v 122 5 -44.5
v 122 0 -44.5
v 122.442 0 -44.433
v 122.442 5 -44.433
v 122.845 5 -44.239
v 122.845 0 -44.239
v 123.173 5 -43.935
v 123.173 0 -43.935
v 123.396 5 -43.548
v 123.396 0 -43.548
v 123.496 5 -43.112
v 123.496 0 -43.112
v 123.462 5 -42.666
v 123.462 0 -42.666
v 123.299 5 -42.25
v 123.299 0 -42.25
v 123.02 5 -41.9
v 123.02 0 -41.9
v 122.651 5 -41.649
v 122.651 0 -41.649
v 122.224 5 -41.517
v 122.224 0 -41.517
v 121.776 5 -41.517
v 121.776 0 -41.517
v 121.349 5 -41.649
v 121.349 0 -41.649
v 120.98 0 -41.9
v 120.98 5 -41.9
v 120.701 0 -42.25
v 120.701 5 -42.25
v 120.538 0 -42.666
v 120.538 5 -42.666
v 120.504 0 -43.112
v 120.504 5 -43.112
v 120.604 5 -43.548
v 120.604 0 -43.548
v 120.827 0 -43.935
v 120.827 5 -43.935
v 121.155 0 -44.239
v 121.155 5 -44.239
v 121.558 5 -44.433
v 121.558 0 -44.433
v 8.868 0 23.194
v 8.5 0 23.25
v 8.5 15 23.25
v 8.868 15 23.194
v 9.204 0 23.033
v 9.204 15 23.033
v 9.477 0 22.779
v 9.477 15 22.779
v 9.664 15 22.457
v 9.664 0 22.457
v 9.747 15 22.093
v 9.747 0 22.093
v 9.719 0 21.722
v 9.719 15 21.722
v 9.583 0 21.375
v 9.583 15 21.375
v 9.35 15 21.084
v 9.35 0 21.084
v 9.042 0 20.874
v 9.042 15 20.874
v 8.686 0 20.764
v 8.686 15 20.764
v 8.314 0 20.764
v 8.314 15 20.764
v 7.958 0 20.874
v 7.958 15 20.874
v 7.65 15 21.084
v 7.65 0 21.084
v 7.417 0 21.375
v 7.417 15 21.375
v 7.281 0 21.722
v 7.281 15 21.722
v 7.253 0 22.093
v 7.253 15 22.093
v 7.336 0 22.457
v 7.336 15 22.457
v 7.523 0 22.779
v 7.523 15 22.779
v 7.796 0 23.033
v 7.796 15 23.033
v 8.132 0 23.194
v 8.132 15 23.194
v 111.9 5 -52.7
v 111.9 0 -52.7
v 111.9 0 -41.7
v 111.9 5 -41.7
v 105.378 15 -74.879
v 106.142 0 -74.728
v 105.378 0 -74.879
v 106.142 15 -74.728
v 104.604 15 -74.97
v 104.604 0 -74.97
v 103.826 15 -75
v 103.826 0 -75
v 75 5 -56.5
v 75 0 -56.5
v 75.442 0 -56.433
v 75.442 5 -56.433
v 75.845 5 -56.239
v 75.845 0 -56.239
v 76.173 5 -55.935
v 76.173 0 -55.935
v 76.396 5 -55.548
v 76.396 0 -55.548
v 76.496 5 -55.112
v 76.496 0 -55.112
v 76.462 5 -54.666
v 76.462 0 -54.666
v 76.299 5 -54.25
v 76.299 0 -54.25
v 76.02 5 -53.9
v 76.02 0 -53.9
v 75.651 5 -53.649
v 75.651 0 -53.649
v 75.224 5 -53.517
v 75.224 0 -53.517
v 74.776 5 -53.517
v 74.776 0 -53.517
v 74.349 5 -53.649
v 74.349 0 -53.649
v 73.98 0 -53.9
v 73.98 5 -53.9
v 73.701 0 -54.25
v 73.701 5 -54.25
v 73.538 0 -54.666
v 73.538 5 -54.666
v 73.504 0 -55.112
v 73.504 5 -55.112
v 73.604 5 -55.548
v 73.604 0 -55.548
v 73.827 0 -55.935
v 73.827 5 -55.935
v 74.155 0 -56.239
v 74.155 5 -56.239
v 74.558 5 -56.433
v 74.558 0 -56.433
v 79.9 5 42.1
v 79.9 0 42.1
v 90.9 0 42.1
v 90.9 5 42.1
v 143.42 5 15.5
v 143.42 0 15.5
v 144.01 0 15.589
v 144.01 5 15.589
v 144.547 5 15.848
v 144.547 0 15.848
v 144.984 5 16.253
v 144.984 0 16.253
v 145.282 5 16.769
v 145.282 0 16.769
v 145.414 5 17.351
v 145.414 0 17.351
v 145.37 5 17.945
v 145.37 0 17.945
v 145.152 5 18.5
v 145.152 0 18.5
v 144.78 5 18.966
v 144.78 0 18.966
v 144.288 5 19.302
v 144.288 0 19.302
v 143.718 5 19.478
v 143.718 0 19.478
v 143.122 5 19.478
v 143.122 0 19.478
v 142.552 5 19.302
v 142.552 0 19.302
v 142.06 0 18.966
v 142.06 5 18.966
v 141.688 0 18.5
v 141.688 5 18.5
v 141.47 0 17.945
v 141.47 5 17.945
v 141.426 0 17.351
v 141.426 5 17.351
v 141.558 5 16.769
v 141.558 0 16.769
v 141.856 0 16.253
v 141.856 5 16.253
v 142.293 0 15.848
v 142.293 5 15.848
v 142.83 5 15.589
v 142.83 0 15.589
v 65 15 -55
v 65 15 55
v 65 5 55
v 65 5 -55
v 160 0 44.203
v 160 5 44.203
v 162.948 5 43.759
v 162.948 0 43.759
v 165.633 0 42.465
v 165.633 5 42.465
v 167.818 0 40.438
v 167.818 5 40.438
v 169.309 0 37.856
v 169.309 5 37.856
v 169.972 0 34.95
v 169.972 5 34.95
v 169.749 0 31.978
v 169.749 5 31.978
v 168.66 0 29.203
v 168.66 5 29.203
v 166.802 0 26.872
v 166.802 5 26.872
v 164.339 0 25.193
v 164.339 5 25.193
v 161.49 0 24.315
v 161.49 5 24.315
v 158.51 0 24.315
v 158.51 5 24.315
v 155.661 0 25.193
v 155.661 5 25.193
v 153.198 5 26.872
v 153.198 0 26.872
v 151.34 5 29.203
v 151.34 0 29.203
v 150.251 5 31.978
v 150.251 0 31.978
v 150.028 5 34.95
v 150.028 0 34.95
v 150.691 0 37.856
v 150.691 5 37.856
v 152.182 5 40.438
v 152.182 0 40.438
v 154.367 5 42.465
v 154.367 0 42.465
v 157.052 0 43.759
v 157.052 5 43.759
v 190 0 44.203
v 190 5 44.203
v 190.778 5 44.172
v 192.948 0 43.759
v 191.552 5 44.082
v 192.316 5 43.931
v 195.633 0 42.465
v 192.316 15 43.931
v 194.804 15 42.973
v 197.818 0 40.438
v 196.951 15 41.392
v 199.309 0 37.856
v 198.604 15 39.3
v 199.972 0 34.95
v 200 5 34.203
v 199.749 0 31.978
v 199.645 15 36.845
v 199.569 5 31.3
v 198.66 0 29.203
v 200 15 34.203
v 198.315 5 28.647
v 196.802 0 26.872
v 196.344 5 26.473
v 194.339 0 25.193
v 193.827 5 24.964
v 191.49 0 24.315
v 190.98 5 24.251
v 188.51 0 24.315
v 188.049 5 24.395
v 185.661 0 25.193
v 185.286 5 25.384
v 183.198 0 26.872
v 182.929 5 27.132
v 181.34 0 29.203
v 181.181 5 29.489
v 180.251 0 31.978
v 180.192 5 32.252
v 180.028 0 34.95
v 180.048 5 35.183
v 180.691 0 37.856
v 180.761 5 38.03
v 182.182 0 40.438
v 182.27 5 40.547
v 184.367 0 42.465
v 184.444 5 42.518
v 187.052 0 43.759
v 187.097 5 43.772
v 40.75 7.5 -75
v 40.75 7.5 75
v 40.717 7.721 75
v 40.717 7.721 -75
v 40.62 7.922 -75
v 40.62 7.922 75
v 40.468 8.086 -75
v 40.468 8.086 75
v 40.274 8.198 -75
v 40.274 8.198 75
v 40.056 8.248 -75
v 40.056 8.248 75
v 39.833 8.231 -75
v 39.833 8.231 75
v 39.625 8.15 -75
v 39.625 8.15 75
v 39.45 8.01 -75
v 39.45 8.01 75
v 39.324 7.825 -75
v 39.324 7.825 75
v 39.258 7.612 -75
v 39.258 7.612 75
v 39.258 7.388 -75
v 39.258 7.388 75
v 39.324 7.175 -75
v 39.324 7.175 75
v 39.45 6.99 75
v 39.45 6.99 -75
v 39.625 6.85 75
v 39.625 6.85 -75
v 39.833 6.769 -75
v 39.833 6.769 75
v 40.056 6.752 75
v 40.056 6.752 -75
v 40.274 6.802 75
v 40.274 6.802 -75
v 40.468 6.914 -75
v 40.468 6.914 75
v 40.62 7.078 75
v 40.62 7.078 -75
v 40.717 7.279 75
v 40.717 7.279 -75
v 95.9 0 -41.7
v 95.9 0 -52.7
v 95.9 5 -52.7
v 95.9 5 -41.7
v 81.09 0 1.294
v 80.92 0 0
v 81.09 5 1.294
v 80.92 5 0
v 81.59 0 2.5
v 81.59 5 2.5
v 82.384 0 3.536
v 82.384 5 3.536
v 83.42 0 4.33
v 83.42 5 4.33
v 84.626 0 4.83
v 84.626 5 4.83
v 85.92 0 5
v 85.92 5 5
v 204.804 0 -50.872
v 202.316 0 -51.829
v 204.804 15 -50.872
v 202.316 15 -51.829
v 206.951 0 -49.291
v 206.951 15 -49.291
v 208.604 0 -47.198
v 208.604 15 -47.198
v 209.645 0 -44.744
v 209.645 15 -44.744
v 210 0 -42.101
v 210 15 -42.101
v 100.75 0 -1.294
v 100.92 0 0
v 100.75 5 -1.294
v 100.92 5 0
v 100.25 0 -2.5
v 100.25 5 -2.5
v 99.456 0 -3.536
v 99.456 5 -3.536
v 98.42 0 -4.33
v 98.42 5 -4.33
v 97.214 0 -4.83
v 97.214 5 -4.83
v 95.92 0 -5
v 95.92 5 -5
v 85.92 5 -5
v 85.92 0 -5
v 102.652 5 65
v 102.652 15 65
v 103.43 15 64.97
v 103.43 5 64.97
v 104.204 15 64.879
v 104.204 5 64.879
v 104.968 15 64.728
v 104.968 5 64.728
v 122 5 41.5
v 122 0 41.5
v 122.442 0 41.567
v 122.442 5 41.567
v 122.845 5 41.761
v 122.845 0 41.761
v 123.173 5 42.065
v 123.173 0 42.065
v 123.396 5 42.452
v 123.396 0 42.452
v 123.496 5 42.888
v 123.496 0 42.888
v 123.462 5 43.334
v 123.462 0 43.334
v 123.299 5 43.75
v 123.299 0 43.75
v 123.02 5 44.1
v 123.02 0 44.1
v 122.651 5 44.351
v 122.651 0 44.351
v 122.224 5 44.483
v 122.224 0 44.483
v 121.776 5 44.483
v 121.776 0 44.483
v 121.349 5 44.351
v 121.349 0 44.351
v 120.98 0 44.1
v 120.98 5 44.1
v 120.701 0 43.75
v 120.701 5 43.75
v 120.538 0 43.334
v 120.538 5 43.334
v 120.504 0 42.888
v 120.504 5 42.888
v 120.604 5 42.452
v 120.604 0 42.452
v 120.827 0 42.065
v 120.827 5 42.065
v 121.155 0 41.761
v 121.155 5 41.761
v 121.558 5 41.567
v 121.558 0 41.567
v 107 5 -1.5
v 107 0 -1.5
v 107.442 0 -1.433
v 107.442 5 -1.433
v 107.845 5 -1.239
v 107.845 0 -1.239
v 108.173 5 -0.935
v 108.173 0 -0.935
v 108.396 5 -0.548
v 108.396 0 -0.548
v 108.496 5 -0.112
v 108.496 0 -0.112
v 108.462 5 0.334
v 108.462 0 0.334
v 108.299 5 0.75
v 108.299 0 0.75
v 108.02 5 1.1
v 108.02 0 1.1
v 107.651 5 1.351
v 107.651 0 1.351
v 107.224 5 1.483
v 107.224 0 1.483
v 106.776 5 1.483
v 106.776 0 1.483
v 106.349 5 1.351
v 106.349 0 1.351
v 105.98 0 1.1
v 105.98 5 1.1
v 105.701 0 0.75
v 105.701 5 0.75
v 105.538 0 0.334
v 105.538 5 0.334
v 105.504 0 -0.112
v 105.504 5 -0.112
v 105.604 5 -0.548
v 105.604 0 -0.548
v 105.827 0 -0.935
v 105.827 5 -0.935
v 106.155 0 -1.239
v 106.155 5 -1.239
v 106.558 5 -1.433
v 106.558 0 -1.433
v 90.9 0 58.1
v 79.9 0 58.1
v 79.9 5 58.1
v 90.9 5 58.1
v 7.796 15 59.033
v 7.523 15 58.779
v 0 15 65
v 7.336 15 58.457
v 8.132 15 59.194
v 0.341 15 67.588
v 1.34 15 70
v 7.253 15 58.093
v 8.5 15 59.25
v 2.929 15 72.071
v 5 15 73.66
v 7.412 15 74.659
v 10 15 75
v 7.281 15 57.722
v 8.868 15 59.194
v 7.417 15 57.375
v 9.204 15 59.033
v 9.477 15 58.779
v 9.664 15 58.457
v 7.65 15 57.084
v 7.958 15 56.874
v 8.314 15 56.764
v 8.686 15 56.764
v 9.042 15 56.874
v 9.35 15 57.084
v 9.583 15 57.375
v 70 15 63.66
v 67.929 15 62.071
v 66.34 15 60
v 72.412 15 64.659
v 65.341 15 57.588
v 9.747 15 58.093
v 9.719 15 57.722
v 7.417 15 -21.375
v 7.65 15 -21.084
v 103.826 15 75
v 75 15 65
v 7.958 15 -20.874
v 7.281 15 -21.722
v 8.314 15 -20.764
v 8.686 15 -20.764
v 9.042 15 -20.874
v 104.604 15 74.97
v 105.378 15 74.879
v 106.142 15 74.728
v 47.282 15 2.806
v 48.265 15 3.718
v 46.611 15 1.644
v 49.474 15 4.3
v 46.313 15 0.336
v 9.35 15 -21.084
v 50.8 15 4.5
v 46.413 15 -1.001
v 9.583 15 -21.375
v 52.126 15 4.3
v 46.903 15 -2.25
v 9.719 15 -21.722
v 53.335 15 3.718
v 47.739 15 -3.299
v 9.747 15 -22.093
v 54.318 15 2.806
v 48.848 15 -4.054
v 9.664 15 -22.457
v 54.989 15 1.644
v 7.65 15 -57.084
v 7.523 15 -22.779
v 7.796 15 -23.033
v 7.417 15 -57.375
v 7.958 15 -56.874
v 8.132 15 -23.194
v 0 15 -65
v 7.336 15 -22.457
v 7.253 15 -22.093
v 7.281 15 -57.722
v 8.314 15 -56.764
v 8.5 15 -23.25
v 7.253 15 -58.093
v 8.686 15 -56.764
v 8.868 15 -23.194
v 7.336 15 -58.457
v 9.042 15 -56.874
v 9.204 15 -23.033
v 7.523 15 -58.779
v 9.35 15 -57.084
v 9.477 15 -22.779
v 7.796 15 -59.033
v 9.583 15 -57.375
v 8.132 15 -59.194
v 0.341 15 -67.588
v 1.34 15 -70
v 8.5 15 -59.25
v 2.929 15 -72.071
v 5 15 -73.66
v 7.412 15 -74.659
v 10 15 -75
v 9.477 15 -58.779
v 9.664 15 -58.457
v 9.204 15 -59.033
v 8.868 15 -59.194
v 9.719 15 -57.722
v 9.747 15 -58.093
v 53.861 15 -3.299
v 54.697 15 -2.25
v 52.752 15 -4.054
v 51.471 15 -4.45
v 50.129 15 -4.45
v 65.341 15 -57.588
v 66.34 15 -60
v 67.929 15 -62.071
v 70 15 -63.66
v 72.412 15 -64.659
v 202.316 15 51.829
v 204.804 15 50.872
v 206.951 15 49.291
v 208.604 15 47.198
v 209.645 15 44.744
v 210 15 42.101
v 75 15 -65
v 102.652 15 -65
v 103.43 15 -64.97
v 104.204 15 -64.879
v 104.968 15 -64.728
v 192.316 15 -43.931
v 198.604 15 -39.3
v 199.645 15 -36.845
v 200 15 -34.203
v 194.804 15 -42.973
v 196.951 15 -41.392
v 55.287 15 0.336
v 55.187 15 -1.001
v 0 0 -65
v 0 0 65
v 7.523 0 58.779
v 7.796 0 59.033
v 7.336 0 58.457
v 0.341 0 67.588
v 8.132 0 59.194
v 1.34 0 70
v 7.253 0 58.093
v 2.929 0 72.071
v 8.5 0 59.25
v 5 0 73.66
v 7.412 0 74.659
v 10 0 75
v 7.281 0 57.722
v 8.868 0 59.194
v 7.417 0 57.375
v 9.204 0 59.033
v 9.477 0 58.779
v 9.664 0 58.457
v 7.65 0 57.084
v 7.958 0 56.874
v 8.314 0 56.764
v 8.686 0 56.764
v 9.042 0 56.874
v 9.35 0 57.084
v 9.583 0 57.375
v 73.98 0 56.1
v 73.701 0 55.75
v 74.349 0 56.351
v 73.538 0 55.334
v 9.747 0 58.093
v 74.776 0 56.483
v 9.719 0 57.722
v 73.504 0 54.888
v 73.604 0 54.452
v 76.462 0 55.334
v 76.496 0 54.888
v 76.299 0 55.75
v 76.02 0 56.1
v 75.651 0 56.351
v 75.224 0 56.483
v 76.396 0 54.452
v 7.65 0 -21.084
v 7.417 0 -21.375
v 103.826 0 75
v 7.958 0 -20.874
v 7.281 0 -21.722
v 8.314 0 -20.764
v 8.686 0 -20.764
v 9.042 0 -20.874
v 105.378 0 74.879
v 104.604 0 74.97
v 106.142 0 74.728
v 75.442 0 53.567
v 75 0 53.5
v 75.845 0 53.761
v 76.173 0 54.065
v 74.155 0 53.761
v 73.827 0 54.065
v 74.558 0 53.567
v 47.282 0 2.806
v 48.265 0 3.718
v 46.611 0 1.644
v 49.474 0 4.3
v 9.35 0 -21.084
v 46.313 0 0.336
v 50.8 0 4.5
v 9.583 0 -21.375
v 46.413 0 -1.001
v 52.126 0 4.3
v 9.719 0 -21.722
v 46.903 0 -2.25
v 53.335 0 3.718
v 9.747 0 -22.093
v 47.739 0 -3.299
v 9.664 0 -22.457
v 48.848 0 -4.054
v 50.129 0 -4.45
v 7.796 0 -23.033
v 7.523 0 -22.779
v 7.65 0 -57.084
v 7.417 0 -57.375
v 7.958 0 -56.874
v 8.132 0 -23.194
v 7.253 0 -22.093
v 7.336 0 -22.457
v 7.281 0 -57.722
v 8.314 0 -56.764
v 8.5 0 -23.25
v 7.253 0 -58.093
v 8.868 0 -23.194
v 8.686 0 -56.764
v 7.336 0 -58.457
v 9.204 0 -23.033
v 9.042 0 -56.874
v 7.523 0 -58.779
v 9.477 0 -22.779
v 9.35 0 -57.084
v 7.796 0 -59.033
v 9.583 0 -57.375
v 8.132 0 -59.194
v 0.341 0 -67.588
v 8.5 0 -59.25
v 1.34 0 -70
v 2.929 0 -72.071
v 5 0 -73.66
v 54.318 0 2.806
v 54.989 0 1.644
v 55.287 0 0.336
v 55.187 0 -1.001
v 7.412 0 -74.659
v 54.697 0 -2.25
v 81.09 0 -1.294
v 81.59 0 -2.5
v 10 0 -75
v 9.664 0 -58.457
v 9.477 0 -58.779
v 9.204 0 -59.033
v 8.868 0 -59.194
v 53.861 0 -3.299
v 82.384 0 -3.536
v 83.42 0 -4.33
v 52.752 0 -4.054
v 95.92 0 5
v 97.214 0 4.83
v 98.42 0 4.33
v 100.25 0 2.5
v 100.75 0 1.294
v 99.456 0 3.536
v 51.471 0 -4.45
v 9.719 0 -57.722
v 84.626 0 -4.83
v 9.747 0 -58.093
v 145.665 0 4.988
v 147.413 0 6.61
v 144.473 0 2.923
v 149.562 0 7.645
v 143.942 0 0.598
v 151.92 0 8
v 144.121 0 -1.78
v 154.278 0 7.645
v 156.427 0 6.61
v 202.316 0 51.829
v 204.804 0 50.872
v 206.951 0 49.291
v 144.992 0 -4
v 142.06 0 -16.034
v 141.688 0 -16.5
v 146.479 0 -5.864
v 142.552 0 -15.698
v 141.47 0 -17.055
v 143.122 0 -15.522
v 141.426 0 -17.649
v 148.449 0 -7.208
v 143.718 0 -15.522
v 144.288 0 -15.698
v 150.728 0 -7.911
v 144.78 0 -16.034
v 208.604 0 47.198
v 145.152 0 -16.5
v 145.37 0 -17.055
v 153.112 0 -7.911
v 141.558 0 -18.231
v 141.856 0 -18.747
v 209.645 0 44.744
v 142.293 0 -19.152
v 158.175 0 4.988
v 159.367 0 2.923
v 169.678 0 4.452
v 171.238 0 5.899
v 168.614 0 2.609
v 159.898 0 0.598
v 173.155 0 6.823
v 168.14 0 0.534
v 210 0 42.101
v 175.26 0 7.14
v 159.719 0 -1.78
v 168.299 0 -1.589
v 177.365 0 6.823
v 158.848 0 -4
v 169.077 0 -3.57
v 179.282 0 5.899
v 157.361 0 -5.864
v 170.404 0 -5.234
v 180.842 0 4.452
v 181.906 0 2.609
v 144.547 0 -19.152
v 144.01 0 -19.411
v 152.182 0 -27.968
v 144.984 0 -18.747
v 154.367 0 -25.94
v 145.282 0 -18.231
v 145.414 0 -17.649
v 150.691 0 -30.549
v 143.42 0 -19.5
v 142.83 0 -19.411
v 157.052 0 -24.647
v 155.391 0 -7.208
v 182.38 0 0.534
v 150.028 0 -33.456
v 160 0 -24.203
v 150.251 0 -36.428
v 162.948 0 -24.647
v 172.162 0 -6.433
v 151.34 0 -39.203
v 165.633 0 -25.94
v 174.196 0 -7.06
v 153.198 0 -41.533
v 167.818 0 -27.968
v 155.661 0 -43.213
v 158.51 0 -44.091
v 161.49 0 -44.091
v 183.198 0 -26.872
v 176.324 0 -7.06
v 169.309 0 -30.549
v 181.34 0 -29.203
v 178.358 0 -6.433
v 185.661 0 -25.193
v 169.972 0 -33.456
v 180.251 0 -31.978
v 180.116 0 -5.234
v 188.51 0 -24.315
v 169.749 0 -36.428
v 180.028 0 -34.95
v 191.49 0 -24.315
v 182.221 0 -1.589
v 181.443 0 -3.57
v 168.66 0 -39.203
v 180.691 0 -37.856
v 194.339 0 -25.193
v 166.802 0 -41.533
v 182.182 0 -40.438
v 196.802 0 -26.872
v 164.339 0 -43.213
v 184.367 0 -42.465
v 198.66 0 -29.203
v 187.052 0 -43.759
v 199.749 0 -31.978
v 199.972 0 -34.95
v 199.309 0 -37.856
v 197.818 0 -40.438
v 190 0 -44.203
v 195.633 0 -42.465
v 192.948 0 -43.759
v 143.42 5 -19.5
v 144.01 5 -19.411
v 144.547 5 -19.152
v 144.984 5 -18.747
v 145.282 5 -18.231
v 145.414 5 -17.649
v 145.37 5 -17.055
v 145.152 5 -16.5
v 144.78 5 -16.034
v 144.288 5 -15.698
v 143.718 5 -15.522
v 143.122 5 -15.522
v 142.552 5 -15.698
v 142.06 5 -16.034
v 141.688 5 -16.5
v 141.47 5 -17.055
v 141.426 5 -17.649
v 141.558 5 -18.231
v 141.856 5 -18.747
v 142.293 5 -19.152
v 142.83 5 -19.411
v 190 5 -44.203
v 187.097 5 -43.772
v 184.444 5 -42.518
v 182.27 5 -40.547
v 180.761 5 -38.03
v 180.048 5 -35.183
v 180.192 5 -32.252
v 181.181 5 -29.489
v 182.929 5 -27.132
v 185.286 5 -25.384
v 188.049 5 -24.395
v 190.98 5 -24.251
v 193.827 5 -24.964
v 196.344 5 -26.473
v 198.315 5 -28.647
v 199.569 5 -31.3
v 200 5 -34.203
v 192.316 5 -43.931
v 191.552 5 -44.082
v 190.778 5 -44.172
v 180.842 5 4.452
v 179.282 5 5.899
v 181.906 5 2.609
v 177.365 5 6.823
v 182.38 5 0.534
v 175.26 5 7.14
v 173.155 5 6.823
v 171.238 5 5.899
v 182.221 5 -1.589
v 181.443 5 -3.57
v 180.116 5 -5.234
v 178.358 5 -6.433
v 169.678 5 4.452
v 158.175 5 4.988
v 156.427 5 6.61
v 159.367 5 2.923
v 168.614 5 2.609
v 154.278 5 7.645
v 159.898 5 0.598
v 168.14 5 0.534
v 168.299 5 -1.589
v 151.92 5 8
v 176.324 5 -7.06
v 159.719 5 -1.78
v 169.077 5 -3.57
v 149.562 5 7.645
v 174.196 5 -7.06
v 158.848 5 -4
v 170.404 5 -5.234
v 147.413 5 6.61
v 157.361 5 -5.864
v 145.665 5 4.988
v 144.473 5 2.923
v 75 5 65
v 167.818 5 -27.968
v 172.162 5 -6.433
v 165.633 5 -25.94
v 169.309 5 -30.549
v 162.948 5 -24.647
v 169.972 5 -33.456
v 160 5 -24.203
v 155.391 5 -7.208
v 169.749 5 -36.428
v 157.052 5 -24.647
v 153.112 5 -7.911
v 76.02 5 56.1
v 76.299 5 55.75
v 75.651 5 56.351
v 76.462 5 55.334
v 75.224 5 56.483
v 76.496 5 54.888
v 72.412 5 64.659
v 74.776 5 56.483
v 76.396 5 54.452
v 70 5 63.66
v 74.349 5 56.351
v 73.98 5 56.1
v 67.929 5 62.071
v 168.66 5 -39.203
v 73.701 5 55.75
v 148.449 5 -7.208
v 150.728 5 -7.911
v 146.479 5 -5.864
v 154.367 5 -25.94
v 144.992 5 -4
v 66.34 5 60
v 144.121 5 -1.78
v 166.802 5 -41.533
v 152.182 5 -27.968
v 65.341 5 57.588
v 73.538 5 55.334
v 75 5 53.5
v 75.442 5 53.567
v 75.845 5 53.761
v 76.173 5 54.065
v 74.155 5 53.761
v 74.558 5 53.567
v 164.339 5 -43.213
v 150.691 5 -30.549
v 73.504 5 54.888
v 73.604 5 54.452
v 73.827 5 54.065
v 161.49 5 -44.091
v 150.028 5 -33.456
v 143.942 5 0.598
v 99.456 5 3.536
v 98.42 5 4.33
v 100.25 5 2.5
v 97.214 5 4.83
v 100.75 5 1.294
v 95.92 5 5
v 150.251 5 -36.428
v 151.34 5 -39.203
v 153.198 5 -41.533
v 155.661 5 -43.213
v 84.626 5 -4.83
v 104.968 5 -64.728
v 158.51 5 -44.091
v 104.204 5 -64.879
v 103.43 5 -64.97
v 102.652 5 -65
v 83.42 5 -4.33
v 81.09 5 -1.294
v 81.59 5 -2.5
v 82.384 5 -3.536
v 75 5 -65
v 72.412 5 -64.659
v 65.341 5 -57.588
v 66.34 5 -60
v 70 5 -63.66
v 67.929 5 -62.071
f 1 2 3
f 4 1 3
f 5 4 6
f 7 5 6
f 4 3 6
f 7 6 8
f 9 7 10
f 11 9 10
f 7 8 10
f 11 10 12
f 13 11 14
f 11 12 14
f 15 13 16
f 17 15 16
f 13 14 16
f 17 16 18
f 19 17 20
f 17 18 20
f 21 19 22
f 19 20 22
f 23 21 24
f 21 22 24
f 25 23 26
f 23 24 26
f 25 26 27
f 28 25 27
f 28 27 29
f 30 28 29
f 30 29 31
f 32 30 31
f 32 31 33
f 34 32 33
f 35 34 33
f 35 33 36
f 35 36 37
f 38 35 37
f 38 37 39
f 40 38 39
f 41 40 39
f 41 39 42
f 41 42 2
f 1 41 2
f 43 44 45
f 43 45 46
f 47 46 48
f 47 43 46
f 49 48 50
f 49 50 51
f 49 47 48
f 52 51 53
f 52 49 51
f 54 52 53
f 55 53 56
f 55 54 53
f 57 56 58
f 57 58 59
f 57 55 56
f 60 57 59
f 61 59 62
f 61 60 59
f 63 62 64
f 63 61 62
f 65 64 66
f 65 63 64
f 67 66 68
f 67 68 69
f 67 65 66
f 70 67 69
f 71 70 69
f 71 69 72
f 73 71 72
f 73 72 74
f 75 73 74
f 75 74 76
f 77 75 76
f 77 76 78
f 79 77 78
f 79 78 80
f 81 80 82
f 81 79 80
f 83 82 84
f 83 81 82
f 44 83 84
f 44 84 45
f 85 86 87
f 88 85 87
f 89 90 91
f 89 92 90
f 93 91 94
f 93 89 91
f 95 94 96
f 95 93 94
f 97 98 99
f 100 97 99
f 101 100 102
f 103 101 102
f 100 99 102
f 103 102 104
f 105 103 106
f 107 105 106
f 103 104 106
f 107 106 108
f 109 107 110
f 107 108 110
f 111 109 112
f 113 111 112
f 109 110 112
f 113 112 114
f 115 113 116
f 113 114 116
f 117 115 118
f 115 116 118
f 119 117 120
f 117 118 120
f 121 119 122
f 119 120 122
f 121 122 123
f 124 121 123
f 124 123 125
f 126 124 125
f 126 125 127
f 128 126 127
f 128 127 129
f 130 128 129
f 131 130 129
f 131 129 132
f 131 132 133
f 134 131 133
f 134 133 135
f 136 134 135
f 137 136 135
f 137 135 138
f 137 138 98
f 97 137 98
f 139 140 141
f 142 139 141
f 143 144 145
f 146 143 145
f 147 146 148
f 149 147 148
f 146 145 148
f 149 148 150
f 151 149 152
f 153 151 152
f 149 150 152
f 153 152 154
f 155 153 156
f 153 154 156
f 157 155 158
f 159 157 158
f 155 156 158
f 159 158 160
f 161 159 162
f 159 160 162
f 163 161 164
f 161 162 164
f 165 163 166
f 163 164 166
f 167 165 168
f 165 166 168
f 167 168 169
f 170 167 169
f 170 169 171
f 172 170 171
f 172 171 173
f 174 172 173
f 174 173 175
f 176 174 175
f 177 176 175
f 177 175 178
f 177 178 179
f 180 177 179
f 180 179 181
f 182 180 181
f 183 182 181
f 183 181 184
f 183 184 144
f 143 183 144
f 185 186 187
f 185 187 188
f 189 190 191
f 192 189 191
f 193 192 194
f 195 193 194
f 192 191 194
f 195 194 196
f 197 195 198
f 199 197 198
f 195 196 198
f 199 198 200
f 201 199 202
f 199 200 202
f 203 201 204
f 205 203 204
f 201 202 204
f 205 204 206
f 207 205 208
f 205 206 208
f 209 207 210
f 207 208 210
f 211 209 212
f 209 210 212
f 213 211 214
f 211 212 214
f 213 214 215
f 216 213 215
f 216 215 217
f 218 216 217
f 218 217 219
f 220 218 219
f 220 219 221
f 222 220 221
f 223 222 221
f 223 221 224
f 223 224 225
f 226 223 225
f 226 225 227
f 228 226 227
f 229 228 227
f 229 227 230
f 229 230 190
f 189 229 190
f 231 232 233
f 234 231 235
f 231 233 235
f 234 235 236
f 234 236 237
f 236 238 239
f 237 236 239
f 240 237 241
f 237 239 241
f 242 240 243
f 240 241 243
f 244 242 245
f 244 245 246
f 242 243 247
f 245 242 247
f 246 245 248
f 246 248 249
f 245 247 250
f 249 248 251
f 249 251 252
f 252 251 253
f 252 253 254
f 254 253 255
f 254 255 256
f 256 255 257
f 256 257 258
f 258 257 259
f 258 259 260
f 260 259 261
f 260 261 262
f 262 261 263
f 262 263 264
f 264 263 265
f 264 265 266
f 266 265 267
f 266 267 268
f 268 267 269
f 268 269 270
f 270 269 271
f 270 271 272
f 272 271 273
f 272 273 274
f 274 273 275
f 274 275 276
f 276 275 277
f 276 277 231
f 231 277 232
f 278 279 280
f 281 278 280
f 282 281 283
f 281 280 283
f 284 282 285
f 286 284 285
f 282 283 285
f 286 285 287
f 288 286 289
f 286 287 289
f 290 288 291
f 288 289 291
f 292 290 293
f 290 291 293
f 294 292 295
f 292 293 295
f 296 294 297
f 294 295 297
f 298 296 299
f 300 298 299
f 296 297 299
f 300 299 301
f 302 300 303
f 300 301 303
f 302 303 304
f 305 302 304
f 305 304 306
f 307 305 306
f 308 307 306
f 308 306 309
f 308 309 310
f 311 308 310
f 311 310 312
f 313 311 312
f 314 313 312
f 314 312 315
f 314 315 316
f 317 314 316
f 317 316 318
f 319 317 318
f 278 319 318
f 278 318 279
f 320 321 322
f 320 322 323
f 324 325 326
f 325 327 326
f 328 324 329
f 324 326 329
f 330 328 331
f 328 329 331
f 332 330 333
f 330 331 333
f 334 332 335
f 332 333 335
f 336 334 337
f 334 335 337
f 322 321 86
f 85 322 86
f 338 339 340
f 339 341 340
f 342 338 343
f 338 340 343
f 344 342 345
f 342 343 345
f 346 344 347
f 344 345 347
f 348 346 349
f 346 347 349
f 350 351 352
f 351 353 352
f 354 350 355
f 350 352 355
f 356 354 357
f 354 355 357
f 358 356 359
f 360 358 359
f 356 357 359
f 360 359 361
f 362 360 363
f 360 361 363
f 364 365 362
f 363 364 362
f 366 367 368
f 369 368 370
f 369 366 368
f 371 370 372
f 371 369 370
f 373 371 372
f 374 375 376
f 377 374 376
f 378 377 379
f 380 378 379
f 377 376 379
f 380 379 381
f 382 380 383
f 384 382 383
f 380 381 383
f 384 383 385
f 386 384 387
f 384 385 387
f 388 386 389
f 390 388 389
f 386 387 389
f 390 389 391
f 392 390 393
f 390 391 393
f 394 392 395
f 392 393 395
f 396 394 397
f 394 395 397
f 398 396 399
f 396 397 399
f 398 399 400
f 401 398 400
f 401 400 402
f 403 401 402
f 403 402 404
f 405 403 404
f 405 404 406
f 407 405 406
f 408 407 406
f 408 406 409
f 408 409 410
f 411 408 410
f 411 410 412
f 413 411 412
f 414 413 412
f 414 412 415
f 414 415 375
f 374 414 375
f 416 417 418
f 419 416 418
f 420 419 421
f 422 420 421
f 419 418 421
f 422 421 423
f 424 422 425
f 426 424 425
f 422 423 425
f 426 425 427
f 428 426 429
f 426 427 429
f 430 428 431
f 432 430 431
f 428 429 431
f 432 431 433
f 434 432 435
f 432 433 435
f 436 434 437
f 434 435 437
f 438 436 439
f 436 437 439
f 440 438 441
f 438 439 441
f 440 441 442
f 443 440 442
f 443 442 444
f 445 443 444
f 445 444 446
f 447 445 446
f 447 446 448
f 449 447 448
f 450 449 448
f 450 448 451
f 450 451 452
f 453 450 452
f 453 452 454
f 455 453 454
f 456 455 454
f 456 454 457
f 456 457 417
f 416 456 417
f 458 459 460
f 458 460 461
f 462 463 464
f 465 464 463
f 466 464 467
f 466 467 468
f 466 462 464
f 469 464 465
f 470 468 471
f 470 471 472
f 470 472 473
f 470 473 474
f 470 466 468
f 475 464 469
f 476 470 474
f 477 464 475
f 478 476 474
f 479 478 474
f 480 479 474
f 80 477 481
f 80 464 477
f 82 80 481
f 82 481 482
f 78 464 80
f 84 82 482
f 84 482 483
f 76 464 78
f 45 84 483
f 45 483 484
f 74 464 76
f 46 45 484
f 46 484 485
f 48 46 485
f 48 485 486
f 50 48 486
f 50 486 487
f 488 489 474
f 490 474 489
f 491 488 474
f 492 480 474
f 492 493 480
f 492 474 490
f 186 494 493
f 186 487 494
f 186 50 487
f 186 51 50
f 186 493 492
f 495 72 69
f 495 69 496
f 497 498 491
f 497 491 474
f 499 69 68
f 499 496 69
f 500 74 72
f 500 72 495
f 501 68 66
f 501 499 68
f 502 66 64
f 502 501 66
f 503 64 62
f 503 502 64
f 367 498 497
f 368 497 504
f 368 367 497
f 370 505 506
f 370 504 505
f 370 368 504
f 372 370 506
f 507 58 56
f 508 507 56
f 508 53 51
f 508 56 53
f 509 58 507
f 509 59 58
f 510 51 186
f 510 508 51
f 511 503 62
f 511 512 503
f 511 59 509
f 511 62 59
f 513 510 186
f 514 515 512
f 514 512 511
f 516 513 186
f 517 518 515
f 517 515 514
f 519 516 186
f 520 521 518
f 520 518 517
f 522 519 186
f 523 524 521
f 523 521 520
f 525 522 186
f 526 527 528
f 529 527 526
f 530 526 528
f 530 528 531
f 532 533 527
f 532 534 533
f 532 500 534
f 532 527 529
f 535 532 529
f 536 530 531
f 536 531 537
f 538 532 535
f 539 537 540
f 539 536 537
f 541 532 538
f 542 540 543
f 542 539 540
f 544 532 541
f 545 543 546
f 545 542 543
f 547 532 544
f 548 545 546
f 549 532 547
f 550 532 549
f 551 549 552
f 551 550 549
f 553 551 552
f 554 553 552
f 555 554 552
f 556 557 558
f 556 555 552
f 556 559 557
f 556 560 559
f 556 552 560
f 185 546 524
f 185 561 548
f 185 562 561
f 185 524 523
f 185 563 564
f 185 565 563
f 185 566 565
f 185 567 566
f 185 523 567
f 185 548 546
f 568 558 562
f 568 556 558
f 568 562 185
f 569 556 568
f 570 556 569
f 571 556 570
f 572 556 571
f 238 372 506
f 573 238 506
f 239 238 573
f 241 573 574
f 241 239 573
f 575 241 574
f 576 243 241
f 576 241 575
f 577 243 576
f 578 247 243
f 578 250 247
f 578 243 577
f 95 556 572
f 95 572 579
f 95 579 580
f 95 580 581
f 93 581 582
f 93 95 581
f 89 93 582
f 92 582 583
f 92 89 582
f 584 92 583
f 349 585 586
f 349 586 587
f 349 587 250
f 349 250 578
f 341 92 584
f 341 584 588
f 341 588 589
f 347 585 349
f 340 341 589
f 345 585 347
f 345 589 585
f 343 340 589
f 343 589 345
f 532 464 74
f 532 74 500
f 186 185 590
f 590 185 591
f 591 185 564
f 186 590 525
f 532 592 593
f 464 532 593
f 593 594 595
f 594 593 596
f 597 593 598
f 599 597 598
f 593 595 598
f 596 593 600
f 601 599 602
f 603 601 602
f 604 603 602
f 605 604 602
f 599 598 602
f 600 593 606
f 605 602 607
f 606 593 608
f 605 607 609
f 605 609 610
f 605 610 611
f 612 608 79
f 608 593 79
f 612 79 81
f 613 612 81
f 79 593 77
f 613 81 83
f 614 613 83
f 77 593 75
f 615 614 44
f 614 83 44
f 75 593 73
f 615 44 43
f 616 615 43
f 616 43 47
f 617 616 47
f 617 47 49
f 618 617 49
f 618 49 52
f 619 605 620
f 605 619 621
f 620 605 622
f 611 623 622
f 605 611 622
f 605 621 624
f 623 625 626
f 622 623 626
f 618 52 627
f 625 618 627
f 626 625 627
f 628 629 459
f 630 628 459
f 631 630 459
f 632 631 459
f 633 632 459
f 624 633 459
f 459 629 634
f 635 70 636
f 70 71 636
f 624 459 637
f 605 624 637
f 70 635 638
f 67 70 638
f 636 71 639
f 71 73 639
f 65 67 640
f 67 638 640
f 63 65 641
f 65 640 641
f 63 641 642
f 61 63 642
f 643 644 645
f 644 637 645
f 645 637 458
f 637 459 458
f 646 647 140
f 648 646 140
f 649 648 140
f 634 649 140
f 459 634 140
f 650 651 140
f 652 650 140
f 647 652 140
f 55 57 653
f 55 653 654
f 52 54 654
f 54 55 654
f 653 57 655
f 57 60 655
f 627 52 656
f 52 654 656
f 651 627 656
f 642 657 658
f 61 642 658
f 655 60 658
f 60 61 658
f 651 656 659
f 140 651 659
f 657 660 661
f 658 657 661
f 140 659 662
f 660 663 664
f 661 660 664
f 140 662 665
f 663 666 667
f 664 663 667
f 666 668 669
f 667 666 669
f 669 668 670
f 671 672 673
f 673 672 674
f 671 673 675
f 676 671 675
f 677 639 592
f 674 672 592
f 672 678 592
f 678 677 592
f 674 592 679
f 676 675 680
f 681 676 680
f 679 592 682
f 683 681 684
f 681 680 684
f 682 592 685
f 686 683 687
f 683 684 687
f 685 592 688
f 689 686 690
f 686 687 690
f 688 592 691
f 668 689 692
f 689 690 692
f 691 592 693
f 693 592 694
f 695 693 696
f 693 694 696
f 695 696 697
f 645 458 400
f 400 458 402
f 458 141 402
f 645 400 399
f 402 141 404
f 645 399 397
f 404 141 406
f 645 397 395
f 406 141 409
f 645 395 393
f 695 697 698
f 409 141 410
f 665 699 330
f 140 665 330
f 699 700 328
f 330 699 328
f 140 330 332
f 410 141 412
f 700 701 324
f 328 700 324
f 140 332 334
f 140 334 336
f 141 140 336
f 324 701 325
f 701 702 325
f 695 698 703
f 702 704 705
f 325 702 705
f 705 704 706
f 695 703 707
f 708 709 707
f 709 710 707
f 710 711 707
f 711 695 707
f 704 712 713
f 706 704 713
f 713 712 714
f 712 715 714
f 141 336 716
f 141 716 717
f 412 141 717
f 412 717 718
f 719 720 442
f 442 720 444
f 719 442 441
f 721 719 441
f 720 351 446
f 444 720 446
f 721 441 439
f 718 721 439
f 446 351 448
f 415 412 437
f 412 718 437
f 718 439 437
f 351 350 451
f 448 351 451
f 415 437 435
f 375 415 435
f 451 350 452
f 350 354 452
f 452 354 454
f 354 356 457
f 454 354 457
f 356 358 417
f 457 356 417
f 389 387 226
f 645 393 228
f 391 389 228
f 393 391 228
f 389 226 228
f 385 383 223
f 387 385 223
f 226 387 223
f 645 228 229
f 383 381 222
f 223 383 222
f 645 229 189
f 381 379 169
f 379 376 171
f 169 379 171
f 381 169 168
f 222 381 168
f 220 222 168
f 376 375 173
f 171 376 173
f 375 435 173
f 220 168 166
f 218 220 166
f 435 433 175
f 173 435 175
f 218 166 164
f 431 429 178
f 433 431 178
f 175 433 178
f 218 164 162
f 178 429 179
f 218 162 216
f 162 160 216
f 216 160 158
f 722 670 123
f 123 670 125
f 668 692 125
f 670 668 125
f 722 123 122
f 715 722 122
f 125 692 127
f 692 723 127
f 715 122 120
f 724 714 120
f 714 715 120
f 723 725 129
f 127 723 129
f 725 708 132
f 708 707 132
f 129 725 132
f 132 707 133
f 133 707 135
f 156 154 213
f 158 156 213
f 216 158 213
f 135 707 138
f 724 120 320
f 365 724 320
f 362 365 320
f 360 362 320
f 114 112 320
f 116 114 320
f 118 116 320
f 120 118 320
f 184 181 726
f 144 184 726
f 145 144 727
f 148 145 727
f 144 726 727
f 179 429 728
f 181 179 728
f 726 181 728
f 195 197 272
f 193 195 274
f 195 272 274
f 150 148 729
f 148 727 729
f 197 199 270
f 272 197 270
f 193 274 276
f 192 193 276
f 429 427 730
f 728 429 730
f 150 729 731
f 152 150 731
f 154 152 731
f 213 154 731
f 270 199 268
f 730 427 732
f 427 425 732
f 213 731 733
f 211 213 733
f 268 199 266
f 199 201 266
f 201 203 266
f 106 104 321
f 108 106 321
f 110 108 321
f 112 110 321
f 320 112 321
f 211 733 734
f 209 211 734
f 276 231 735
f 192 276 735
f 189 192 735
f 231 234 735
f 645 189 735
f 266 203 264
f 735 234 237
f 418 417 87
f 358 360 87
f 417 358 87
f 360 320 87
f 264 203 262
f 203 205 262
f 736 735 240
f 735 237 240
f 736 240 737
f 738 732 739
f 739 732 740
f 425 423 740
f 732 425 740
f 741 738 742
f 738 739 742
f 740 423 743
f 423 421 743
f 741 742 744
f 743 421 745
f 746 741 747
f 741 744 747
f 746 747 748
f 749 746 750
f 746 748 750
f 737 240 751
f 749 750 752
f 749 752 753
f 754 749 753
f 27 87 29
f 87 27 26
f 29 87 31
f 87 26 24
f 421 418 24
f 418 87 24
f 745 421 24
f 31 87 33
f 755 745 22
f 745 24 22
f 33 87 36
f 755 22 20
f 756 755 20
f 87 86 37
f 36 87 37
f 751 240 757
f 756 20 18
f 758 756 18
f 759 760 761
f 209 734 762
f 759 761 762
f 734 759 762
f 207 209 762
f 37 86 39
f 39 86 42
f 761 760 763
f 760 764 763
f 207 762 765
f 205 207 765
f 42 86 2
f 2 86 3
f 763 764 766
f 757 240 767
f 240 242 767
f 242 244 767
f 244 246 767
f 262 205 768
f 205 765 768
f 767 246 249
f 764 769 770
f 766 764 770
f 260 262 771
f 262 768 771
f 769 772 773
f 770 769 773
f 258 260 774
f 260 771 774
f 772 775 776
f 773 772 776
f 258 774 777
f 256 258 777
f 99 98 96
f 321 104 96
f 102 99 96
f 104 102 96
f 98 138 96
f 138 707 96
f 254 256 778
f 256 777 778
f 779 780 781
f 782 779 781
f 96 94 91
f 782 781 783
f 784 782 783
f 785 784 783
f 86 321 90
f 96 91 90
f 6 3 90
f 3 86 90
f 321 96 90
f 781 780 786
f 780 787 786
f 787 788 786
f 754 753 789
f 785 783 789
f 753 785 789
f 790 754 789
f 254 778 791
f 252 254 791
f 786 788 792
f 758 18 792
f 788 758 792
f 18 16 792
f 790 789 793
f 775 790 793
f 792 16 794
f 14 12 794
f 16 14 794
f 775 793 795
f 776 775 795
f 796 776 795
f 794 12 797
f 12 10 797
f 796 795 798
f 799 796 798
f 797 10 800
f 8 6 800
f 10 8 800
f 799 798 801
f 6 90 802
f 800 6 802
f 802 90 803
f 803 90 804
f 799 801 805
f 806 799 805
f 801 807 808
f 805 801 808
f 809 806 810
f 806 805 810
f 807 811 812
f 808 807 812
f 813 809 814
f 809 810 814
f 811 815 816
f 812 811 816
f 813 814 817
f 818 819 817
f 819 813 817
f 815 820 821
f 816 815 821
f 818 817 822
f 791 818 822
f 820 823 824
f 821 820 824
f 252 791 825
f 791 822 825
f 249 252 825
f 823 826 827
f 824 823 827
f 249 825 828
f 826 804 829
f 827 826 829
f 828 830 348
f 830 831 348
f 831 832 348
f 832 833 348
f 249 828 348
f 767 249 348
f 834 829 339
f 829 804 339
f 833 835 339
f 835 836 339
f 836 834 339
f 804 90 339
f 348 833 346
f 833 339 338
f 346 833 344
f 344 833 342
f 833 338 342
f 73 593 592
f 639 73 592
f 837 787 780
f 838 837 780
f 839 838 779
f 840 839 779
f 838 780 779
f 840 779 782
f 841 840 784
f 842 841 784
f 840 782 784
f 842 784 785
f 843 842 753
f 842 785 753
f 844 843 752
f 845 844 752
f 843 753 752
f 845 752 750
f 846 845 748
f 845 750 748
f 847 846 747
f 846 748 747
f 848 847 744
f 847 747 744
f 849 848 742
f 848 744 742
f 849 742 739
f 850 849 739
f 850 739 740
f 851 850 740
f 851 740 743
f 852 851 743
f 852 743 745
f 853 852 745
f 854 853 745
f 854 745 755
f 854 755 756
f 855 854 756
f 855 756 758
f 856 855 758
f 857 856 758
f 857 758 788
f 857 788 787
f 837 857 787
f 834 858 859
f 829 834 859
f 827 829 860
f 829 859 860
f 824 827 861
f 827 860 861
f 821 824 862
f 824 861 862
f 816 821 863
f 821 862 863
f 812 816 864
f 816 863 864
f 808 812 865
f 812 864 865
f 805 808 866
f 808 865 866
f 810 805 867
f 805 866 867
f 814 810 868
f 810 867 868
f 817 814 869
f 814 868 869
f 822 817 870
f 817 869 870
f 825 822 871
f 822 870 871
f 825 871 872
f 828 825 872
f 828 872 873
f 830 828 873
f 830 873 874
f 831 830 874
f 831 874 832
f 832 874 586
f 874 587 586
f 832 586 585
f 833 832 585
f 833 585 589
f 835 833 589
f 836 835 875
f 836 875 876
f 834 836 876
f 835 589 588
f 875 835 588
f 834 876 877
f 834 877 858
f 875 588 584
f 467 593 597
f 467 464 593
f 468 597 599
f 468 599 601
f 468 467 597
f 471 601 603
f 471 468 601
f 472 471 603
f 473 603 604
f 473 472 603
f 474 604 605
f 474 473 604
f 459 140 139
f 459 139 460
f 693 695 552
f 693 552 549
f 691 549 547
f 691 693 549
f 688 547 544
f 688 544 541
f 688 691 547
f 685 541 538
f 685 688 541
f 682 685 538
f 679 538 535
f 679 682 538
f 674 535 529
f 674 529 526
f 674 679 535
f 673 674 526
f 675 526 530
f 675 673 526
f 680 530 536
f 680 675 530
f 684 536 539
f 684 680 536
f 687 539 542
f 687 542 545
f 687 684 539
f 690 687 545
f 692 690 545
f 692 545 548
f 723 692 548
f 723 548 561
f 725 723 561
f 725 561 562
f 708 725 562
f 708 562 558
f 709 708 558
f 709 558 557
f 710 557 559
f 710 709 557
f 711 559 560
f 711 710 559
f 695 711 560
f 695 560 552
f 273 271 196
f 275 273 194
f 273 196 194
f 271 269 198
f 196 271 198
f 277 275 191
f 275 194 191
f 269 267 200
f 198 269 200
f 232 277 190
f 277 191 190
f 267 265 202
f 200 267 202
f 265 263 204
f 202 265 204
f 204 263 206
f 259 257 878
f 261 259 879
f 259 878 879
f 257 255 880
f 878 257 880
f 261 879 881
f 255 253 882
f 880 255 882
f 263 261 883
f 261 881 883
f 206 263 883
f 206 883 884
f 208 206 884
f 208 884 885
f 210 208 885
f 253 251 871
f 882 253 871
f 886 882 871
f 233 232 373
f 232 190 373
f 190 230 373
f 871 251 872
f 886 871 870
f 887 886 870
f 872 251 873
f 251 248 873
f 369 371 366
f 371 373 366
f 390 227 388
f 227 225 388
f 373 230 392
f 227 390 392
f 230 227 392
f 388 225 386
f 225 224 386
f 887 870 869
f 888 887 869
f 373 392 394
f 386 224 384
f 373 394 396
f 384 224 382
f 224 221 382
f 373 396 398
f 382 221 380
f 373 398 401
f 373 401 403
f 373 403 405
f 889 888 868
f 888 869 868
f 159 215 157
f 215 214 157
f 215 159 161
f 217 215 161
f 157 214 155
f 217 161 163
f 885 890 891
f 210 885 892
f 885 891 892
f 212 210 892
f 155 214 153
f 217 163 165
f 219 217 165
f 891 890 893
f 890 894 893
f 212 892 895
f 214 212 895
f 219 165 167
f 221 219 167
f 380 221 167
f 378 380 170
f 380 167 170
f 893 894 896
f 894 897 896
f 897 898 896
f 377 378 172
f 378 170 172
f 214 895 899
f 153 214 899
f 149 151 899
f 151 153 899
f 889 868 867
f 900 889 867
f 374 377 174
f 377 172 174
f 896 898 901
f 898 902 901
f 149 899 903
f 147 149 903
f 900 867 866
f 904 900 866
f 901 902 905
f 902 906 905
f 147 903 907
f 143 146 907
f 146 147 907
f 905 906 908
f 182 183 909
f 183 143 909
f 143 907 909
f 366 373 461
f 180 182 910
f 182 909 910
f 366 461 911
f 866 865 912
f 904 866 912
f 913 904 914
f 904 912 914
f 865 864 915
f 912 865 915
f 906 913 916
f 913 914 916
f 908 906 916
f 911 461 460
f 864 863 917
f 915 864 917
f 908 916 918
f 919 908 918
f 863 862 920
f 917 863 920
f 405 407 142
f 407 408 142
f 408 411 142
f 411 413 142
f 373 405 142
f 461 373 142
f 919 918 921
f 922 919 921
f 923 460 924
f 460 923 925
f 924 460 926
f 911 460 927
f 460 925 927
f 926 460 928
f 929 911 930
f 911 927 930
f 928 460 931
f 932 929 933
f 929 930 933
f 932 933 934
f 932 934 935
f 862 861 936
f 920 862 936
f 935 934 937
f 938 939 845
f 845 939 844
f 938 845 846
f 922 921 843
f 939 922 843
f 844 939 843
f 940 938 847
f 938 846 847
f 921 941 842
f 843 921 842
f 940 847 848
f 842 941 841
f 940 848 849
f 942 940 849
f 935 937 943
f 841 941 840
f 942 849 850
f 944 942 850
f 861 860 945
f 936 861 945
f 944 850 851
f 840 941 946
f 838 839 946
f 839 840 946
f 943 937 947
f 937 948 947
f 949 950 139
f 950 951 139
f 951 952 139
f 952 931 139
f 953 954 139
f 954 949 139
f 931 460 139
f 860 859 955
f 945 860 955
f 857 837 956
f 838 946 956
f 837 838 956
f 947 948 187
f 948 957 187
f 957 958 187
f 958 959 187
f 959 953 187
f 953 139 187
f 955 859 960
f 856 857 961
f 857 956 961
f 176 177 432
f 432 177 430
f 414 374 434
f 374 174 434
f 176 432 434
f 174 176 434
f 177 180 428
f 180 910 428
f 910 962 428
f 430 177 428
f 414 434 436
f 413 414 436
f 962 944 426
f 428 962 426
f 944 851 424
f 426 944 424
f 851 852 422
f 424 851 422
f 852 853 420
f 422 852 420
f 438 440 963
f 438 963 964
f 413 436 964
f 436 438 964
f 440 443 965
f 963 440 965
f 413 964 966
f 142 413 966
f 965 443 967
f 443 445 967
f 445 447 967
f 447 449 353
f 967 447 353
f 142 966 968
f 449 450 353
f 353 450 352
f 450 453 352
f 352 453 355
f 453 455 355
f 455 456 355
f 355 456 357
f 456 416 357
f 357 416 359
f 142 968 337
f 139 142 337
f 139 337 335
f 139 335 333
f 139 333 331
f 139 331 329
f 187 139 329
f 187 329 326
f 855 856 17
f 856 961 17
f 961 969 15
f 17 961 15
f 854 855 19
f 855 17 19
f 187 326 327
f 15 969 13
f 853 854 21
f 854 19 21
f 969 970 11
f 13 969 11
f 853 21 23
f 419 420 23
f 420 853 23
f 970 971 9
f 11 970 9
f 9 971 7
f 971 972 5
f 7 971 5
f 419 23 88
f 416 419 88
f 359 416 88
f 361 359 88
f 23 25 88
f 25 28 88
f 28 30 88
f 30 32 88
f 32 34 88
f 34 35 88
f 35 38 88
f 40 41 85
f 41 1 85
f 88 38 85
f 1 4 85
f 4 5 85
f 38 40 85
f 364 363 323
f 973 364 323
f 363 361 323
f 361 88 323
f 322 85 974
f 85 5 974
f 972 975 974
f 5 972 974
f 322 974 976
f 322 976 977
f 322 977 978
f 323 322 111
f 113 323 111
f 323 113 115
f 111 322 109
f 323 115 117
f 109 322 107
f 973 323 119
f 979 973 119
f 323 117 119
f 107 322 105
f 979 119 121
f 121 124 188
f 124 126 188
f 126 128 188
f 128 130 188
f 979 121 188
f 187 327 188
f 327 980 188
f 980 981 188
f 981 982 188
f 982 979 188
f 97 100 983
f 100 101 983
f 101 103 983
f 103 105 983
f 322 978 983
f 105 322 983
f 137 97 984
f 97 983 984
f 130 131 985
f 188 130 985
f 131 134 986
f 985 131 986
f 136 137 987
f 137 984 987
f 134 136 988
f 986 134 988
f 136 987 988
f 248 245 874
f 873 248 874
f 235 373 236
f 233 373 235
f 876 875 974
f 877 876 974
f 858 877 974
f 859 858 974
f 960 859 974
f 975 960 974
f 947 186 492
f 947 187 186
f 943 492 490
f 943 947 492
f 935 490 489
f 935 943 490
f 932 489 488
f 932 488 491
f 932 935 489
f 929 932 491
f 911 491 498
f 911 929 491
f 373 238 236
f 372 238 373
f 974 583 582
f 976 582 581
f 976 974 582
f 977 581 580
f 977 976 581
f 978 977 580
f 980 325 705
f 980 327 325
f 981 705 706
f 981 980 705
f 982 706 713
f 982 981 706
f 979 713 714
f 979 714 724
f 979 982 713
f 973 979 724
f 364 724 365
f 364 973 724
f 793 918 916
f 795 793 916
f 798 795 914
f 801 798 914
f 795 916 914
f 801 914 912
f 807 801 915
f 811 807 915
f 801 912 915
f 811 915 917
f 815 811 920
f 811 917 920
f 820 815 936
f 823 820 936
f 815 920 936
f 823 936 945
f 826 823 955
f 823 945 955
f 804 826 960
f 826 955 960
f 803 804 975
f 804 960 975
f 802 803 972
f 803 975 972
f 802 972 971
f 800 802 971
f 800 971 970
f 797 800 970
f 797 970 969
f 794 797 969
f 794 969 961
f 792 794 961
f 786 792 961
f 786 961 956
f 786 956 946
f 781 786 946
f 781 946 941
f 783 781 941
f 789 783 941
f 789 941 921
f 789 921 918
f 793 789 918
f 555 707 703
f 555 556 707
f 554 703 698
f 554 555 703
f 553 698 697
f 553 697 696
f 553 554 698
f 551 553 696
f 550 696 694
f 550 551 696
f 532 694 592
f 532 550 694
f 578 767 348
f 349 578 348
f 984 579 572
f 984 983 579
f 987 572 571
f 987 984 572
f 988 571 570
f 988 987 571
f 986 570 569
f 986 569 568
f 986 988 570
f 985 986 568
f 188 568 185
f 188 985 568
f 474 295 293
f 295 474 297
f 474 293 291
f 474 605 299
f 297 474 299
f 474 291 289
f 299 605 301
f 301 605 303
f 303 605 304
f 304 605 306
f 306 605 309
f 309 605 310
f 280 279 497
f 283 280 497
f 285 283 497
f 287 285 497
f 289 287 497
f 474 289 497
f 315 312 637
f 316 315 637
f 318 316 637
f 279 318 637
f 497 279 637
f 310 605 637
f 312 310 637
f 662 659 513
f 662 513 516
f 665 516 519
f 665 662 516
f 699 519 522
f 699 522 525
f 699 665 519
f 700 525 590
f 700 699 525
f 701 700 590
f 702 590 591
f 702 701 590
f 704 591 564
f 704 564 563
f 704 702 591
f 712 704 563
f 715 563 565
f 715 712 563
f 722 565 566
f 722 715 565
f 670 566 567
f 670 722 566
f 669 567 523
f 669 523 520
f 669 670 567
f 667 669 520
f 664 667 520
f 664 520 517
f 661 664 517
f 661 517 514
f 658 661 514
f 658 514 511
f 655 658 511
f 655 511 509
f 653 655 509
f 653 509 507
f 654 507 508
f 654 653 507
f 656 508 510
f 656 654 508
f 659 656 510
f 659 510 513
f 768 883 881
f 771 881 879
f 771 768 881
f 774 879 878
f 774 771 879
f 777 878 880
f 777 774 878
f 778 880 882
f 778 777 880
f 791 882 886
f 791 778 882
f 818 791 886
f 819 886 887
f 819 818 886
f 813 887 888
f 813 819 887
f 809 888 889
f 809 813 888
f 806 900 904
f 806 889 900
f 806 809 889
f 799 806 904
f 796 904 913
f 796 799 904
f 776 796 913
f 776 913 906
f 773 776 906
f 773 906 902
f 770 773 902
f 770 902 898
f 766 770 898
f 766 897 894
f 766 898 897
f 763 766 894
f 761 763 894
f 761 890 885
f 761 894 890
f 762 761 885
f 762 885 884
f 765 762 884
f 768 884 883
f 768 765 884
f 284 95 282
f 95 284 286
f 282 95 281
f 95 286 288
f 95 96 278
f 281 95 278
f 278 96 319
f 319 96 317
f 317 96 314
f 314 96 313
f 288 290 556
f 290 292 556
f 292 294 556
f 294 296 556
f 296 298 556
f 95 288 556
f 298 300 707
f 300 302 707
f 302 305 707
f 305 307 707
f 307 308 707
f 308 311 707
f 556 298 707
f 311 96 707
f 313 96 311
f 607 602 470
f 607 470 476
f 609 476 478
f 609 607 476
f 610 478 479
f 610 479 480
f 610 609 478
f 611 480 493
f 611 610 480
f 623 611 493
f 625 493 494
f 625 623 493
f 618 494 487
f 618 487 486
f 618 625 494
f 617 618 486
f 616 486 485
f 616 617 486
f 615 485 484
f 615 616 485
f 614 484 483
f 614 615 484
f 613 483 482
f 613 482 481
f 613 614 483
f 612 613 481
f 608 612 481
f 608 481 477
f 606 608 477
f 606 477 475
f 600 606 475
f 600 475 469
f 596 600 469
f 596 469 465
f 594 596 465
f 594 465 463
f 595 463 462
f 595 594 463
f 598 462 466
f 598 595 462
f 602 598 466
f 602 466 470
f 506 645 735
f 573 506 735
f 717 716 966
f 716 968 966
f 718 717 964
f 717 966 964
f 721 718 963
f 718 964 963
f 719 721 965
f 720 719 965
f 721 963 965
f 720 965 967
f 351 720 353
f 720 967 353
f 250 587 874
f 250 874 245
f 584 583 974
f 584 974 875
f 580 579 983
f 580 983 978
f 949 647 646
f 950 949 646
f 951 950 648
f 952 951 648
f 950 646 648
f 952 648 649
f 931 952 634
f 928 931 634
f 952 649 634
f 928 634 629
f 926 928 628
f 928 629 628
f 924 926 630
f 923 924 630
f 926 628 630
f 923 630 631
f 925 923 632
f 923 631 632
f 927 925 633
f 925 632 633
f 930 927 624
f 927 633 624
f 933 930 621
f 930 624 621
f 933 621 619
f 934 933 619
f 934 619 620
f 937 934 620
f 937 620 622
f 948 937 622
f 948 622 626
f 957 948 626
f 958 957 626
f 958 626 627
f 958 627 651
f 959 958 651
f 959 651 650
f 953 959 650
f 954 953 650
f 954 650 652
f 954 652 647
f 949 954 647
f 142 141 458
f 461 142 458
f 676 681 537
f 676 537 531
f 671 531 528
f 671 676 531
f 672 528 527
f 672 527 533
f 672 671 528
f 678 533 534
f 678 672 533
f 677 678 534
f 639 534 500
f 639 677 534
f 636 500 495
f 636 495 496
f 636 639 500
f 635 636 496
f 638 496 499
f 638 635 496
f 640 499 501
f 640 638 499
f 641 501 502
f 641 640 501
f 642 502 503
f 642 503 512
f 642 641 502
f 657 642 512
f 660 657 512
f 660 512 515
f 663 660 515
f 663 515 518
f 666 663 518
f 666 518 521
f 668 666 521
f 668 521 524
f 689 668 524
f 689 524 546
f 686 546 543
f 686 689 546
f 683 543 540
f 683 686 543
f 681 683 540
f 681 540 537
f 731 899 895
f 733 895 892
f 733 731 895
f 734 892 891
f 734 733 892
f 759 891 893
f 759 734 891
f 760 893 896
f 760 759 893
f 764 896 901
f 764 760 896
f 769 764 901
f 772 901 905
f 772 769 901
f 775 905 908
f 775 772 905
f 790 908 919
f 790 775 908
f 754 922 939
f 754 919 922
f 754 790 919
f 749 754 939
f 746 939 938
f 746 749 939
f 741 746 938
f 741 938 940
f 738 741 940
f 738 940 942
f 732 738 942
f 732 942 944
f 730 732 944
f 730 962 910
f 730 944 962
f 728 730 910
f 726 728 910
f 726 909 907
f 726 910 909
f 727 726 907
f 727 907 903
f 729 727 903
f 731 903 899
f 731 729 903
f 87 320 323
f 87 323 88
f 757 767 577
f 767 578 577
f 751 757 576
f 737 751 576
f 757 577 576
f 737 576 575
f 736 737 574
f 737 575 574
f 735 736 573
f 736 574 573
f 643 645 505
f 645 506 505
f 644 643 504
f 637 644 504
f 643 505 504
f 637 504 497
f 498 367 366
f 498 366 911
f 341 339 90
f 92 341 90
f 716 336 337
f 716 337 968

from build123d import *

# Parameters (mm, degrees)
ESBO_O1_R                = 4.5
ESBO_O1_R_2              = 7.14
ESBO_O1_R_3              = 8
ESBO_O1_R_4              = 1.25
RESSALTO_EXTRUS_O1_DEPTH = 15
CORTE_EXTRUS_O2_DEPTH    = 10
FILETE1_R                = 10
ESBO_O5_R                = 2
ESBO_O5_W                = 20
ESBO_O5_H                = 10
CORTE_EXTRUS_O4_DEPTH    = 224.494966386
FILETE2_R                = 5
ESBO_O6_R                = 10
CORTE_EXTRUS_O5_DEPTH    = 224.494966386
ESBO_O7_W                = 11
ESBO_O7_H                = 16
ESBO_O7_W_2              = 16
ESBO_O7_H_2              = 11
ESBO_O7_R                = 1.5
CORTE_EXTRUS_O6_DEPTH    = 224.494966386
ESBO_O8_R                = 0.75
CORTE_EXTRUS_O7_DEPTH    = 259.505319094


with BuildPart() as part:
    # Esboço1 → Ressalto-extrusão1 (new body)
    with BuildSketch(Plane(origin=(0, 0, 0), x_dir=(1, 0, 0), z_dir=(0, 1, 0))):
        Polygon((210, 50), (105, 75), (0, 75), (0, -75), (105, -75), (210, -50), align=None)
        with Locations(Location((50.8, 0, 0), (0, 0, 270))):
            Circle(ESBO_O1_R, mode=Mode.SUBTRACT)
        with Locations(Location((175.26, 0, 0), (0, 0, 270))):
            Circle(ESBO_O1_R_2, mode=Mode.SUBTRACT)
        with Locations(Location((151.92, 0, 0), (0, 0, 270))):
            Circle(ESBO_O1_R_3, mode=Mode.SUBTRACT)
        with Locations(Location((8.5, -58, 0), (0, 0, 270))):
            Circle(ESBO_O1_R_4, mode=Mode.SUBTRACT)
        with Locations(Location((8.5, -22, 0), (0, 0, 270))):
            Circle(ESBO_O1_R_4, mode=Mode.SUBTRACT)
        with Locations(Location((8.5, 22, 0), (0, 0, 90))):
            Circle(ESBO_O1_R_4, mode=Mode.SUBTRACT)
        with Locations(Location((8.5, 58, 0), (0, 0, 90))):
            Circle(ESBO_O1_R_4, mode=Mode.SUBTRACT)
    extrude(amount=RESSALTO_EXTRUS_O1_DEPTH)

    # Esboço3 → Corte-extrusão2 (cut)
    with BuildSketch(Plane(origin=(0, 15, 0), x_dir=(1, 0, 0), z_dir=(0, 1, 0))):
        Polygon((200, 42.101412788), (200, -42.101412788), (103.82593371, -65), (65, -65), (65, 65), (103.82593371, 65), align=None)
    extrude(amount=-CORTE_EXTRUS_O2_DEPTH, mode=Mode.SUBTRACT)

    # Filete1
    filete1_edges = [part.edges().sort_by_distance(p)[0] for p in [
        (0, 7.5, -75),
        (105, 7.5, -75),
        (210, 7.5, -50),
        (210, 7.5, 50),
        (105, 7.5, 75),
        (0, 7.5, 75),
        (65, 10, 65),
        (65, 10, -65),
        (103.82593371, 10, -65),
        (200, 10, -42.101412788),
        (200, 10, 42.101412788),
        (103.82593371, 10, 65),
    ]]
    fillet(filete1_edges, radius=FILETE1_R)

    # Esboço5 → Corte-extrusão4 (cut, through all)
    with BuildSketch(Plane.XZ):
        with Locations(Location((143.42, 17.5, 0), (0, 0, 270))):
            Circle(ESBO_O5_R)
        with Locations(Location((143.42, -17.5, 0), (0, 0, 270))):
            Circle(ESBO_O5_R)
        with Locations((90.92, 0)):
            Rectangle(ESBO_O5_W, ESBO_O5_H)
    extrude(amount=-CORTE_EXTRUS_O4_DEPTH, mode=Mode.SUBTRACT)

    # Filete2
    filete2_edges = [part.edges().sort_by_distance(p)[0] for p in [
        (80.92, 2.5, -5),
        (80.92, 2.5, 5),
        (100.92, 2.5, 5),
        (100.92, 2.5, -5),
    ]]
    fillet(filete2_edges, radius=FILETE2_R - 0.0001)  # a hair under: the kernel refuses the full size

    # Esboço6 → Corte-extrusão5 (cut, through all)
    with BuildSketch(Plane(origin=(0, 15, 0), x_dir=(1, 0, 0), z_dir=(0, 1, 0))):
        with Locations(Location((190, -34.202825576, 0), (0, 0, 270))):
            Circle(ESBO_O6_R)
        with Locations(Location((190, 34.202825576, 0), (0, 0, 90))):
            Circle(ESBO_O6_R)
        with Locations(Location((160, 34.202825576, 0), (0, 0, 270))):
            Circle(ESBO_O6_R)
        with Locations(Location((160, -34.202825576, 0), (0, 0, 270))):
            Circle(ESBO_O6_R)
    extrude(amount=-CORTE_EXTRUS_O5_DEPTH, mode=Mode.SUBTRACT)

    # Esboço7 → Corte-extrusão6 (cut, through all)
    with BuildSketch(Plane.XZ):
        with Locations((85.4, 50.1)):
            Rectangle(ESBO_O7_W, ESBO_O7_H)
        with Locations((103.9, -47.2)):
            Rectangle(ESBO_O7_W_2, ESBO_O7_H_2)
        with Locations(Location((75, 55, 0), (0, 0, 270))):
            Circle(ESBO_O7_R)
        with Locations(Location((122, 43, 0), (0, 0, 270))):
            Circle(ESBO_O7_R)
        with Locations(Location((107, 0, 0), (0, 0, 270))):
            Circle(ESBO_O7_R)
        with Locations(Location((75, -55, 0), (0, 0, 270))):
            Circle(ESBO_O7_R)
        with Locations(Location((122, -43, 0), (0, 0, 270))):
            Circle(ESBO_O7_R)
    extrude(amount=-CORTE_EXTRUS_O6_DEPTH, mode=Mode.SUBTRACT)

    # Esboço8 → Corte-extrusão7 (cut, through all)
    with BuildSketch(Plane.XY.offset(75)):
        with Locations((40, 7.5)):
            Circle(ESBO_O8_R)
    extrude(amount=-CORTE_EXTRUS_O7_DEPTH, mode=Mode.SUBTRACT)


solid = part.part
